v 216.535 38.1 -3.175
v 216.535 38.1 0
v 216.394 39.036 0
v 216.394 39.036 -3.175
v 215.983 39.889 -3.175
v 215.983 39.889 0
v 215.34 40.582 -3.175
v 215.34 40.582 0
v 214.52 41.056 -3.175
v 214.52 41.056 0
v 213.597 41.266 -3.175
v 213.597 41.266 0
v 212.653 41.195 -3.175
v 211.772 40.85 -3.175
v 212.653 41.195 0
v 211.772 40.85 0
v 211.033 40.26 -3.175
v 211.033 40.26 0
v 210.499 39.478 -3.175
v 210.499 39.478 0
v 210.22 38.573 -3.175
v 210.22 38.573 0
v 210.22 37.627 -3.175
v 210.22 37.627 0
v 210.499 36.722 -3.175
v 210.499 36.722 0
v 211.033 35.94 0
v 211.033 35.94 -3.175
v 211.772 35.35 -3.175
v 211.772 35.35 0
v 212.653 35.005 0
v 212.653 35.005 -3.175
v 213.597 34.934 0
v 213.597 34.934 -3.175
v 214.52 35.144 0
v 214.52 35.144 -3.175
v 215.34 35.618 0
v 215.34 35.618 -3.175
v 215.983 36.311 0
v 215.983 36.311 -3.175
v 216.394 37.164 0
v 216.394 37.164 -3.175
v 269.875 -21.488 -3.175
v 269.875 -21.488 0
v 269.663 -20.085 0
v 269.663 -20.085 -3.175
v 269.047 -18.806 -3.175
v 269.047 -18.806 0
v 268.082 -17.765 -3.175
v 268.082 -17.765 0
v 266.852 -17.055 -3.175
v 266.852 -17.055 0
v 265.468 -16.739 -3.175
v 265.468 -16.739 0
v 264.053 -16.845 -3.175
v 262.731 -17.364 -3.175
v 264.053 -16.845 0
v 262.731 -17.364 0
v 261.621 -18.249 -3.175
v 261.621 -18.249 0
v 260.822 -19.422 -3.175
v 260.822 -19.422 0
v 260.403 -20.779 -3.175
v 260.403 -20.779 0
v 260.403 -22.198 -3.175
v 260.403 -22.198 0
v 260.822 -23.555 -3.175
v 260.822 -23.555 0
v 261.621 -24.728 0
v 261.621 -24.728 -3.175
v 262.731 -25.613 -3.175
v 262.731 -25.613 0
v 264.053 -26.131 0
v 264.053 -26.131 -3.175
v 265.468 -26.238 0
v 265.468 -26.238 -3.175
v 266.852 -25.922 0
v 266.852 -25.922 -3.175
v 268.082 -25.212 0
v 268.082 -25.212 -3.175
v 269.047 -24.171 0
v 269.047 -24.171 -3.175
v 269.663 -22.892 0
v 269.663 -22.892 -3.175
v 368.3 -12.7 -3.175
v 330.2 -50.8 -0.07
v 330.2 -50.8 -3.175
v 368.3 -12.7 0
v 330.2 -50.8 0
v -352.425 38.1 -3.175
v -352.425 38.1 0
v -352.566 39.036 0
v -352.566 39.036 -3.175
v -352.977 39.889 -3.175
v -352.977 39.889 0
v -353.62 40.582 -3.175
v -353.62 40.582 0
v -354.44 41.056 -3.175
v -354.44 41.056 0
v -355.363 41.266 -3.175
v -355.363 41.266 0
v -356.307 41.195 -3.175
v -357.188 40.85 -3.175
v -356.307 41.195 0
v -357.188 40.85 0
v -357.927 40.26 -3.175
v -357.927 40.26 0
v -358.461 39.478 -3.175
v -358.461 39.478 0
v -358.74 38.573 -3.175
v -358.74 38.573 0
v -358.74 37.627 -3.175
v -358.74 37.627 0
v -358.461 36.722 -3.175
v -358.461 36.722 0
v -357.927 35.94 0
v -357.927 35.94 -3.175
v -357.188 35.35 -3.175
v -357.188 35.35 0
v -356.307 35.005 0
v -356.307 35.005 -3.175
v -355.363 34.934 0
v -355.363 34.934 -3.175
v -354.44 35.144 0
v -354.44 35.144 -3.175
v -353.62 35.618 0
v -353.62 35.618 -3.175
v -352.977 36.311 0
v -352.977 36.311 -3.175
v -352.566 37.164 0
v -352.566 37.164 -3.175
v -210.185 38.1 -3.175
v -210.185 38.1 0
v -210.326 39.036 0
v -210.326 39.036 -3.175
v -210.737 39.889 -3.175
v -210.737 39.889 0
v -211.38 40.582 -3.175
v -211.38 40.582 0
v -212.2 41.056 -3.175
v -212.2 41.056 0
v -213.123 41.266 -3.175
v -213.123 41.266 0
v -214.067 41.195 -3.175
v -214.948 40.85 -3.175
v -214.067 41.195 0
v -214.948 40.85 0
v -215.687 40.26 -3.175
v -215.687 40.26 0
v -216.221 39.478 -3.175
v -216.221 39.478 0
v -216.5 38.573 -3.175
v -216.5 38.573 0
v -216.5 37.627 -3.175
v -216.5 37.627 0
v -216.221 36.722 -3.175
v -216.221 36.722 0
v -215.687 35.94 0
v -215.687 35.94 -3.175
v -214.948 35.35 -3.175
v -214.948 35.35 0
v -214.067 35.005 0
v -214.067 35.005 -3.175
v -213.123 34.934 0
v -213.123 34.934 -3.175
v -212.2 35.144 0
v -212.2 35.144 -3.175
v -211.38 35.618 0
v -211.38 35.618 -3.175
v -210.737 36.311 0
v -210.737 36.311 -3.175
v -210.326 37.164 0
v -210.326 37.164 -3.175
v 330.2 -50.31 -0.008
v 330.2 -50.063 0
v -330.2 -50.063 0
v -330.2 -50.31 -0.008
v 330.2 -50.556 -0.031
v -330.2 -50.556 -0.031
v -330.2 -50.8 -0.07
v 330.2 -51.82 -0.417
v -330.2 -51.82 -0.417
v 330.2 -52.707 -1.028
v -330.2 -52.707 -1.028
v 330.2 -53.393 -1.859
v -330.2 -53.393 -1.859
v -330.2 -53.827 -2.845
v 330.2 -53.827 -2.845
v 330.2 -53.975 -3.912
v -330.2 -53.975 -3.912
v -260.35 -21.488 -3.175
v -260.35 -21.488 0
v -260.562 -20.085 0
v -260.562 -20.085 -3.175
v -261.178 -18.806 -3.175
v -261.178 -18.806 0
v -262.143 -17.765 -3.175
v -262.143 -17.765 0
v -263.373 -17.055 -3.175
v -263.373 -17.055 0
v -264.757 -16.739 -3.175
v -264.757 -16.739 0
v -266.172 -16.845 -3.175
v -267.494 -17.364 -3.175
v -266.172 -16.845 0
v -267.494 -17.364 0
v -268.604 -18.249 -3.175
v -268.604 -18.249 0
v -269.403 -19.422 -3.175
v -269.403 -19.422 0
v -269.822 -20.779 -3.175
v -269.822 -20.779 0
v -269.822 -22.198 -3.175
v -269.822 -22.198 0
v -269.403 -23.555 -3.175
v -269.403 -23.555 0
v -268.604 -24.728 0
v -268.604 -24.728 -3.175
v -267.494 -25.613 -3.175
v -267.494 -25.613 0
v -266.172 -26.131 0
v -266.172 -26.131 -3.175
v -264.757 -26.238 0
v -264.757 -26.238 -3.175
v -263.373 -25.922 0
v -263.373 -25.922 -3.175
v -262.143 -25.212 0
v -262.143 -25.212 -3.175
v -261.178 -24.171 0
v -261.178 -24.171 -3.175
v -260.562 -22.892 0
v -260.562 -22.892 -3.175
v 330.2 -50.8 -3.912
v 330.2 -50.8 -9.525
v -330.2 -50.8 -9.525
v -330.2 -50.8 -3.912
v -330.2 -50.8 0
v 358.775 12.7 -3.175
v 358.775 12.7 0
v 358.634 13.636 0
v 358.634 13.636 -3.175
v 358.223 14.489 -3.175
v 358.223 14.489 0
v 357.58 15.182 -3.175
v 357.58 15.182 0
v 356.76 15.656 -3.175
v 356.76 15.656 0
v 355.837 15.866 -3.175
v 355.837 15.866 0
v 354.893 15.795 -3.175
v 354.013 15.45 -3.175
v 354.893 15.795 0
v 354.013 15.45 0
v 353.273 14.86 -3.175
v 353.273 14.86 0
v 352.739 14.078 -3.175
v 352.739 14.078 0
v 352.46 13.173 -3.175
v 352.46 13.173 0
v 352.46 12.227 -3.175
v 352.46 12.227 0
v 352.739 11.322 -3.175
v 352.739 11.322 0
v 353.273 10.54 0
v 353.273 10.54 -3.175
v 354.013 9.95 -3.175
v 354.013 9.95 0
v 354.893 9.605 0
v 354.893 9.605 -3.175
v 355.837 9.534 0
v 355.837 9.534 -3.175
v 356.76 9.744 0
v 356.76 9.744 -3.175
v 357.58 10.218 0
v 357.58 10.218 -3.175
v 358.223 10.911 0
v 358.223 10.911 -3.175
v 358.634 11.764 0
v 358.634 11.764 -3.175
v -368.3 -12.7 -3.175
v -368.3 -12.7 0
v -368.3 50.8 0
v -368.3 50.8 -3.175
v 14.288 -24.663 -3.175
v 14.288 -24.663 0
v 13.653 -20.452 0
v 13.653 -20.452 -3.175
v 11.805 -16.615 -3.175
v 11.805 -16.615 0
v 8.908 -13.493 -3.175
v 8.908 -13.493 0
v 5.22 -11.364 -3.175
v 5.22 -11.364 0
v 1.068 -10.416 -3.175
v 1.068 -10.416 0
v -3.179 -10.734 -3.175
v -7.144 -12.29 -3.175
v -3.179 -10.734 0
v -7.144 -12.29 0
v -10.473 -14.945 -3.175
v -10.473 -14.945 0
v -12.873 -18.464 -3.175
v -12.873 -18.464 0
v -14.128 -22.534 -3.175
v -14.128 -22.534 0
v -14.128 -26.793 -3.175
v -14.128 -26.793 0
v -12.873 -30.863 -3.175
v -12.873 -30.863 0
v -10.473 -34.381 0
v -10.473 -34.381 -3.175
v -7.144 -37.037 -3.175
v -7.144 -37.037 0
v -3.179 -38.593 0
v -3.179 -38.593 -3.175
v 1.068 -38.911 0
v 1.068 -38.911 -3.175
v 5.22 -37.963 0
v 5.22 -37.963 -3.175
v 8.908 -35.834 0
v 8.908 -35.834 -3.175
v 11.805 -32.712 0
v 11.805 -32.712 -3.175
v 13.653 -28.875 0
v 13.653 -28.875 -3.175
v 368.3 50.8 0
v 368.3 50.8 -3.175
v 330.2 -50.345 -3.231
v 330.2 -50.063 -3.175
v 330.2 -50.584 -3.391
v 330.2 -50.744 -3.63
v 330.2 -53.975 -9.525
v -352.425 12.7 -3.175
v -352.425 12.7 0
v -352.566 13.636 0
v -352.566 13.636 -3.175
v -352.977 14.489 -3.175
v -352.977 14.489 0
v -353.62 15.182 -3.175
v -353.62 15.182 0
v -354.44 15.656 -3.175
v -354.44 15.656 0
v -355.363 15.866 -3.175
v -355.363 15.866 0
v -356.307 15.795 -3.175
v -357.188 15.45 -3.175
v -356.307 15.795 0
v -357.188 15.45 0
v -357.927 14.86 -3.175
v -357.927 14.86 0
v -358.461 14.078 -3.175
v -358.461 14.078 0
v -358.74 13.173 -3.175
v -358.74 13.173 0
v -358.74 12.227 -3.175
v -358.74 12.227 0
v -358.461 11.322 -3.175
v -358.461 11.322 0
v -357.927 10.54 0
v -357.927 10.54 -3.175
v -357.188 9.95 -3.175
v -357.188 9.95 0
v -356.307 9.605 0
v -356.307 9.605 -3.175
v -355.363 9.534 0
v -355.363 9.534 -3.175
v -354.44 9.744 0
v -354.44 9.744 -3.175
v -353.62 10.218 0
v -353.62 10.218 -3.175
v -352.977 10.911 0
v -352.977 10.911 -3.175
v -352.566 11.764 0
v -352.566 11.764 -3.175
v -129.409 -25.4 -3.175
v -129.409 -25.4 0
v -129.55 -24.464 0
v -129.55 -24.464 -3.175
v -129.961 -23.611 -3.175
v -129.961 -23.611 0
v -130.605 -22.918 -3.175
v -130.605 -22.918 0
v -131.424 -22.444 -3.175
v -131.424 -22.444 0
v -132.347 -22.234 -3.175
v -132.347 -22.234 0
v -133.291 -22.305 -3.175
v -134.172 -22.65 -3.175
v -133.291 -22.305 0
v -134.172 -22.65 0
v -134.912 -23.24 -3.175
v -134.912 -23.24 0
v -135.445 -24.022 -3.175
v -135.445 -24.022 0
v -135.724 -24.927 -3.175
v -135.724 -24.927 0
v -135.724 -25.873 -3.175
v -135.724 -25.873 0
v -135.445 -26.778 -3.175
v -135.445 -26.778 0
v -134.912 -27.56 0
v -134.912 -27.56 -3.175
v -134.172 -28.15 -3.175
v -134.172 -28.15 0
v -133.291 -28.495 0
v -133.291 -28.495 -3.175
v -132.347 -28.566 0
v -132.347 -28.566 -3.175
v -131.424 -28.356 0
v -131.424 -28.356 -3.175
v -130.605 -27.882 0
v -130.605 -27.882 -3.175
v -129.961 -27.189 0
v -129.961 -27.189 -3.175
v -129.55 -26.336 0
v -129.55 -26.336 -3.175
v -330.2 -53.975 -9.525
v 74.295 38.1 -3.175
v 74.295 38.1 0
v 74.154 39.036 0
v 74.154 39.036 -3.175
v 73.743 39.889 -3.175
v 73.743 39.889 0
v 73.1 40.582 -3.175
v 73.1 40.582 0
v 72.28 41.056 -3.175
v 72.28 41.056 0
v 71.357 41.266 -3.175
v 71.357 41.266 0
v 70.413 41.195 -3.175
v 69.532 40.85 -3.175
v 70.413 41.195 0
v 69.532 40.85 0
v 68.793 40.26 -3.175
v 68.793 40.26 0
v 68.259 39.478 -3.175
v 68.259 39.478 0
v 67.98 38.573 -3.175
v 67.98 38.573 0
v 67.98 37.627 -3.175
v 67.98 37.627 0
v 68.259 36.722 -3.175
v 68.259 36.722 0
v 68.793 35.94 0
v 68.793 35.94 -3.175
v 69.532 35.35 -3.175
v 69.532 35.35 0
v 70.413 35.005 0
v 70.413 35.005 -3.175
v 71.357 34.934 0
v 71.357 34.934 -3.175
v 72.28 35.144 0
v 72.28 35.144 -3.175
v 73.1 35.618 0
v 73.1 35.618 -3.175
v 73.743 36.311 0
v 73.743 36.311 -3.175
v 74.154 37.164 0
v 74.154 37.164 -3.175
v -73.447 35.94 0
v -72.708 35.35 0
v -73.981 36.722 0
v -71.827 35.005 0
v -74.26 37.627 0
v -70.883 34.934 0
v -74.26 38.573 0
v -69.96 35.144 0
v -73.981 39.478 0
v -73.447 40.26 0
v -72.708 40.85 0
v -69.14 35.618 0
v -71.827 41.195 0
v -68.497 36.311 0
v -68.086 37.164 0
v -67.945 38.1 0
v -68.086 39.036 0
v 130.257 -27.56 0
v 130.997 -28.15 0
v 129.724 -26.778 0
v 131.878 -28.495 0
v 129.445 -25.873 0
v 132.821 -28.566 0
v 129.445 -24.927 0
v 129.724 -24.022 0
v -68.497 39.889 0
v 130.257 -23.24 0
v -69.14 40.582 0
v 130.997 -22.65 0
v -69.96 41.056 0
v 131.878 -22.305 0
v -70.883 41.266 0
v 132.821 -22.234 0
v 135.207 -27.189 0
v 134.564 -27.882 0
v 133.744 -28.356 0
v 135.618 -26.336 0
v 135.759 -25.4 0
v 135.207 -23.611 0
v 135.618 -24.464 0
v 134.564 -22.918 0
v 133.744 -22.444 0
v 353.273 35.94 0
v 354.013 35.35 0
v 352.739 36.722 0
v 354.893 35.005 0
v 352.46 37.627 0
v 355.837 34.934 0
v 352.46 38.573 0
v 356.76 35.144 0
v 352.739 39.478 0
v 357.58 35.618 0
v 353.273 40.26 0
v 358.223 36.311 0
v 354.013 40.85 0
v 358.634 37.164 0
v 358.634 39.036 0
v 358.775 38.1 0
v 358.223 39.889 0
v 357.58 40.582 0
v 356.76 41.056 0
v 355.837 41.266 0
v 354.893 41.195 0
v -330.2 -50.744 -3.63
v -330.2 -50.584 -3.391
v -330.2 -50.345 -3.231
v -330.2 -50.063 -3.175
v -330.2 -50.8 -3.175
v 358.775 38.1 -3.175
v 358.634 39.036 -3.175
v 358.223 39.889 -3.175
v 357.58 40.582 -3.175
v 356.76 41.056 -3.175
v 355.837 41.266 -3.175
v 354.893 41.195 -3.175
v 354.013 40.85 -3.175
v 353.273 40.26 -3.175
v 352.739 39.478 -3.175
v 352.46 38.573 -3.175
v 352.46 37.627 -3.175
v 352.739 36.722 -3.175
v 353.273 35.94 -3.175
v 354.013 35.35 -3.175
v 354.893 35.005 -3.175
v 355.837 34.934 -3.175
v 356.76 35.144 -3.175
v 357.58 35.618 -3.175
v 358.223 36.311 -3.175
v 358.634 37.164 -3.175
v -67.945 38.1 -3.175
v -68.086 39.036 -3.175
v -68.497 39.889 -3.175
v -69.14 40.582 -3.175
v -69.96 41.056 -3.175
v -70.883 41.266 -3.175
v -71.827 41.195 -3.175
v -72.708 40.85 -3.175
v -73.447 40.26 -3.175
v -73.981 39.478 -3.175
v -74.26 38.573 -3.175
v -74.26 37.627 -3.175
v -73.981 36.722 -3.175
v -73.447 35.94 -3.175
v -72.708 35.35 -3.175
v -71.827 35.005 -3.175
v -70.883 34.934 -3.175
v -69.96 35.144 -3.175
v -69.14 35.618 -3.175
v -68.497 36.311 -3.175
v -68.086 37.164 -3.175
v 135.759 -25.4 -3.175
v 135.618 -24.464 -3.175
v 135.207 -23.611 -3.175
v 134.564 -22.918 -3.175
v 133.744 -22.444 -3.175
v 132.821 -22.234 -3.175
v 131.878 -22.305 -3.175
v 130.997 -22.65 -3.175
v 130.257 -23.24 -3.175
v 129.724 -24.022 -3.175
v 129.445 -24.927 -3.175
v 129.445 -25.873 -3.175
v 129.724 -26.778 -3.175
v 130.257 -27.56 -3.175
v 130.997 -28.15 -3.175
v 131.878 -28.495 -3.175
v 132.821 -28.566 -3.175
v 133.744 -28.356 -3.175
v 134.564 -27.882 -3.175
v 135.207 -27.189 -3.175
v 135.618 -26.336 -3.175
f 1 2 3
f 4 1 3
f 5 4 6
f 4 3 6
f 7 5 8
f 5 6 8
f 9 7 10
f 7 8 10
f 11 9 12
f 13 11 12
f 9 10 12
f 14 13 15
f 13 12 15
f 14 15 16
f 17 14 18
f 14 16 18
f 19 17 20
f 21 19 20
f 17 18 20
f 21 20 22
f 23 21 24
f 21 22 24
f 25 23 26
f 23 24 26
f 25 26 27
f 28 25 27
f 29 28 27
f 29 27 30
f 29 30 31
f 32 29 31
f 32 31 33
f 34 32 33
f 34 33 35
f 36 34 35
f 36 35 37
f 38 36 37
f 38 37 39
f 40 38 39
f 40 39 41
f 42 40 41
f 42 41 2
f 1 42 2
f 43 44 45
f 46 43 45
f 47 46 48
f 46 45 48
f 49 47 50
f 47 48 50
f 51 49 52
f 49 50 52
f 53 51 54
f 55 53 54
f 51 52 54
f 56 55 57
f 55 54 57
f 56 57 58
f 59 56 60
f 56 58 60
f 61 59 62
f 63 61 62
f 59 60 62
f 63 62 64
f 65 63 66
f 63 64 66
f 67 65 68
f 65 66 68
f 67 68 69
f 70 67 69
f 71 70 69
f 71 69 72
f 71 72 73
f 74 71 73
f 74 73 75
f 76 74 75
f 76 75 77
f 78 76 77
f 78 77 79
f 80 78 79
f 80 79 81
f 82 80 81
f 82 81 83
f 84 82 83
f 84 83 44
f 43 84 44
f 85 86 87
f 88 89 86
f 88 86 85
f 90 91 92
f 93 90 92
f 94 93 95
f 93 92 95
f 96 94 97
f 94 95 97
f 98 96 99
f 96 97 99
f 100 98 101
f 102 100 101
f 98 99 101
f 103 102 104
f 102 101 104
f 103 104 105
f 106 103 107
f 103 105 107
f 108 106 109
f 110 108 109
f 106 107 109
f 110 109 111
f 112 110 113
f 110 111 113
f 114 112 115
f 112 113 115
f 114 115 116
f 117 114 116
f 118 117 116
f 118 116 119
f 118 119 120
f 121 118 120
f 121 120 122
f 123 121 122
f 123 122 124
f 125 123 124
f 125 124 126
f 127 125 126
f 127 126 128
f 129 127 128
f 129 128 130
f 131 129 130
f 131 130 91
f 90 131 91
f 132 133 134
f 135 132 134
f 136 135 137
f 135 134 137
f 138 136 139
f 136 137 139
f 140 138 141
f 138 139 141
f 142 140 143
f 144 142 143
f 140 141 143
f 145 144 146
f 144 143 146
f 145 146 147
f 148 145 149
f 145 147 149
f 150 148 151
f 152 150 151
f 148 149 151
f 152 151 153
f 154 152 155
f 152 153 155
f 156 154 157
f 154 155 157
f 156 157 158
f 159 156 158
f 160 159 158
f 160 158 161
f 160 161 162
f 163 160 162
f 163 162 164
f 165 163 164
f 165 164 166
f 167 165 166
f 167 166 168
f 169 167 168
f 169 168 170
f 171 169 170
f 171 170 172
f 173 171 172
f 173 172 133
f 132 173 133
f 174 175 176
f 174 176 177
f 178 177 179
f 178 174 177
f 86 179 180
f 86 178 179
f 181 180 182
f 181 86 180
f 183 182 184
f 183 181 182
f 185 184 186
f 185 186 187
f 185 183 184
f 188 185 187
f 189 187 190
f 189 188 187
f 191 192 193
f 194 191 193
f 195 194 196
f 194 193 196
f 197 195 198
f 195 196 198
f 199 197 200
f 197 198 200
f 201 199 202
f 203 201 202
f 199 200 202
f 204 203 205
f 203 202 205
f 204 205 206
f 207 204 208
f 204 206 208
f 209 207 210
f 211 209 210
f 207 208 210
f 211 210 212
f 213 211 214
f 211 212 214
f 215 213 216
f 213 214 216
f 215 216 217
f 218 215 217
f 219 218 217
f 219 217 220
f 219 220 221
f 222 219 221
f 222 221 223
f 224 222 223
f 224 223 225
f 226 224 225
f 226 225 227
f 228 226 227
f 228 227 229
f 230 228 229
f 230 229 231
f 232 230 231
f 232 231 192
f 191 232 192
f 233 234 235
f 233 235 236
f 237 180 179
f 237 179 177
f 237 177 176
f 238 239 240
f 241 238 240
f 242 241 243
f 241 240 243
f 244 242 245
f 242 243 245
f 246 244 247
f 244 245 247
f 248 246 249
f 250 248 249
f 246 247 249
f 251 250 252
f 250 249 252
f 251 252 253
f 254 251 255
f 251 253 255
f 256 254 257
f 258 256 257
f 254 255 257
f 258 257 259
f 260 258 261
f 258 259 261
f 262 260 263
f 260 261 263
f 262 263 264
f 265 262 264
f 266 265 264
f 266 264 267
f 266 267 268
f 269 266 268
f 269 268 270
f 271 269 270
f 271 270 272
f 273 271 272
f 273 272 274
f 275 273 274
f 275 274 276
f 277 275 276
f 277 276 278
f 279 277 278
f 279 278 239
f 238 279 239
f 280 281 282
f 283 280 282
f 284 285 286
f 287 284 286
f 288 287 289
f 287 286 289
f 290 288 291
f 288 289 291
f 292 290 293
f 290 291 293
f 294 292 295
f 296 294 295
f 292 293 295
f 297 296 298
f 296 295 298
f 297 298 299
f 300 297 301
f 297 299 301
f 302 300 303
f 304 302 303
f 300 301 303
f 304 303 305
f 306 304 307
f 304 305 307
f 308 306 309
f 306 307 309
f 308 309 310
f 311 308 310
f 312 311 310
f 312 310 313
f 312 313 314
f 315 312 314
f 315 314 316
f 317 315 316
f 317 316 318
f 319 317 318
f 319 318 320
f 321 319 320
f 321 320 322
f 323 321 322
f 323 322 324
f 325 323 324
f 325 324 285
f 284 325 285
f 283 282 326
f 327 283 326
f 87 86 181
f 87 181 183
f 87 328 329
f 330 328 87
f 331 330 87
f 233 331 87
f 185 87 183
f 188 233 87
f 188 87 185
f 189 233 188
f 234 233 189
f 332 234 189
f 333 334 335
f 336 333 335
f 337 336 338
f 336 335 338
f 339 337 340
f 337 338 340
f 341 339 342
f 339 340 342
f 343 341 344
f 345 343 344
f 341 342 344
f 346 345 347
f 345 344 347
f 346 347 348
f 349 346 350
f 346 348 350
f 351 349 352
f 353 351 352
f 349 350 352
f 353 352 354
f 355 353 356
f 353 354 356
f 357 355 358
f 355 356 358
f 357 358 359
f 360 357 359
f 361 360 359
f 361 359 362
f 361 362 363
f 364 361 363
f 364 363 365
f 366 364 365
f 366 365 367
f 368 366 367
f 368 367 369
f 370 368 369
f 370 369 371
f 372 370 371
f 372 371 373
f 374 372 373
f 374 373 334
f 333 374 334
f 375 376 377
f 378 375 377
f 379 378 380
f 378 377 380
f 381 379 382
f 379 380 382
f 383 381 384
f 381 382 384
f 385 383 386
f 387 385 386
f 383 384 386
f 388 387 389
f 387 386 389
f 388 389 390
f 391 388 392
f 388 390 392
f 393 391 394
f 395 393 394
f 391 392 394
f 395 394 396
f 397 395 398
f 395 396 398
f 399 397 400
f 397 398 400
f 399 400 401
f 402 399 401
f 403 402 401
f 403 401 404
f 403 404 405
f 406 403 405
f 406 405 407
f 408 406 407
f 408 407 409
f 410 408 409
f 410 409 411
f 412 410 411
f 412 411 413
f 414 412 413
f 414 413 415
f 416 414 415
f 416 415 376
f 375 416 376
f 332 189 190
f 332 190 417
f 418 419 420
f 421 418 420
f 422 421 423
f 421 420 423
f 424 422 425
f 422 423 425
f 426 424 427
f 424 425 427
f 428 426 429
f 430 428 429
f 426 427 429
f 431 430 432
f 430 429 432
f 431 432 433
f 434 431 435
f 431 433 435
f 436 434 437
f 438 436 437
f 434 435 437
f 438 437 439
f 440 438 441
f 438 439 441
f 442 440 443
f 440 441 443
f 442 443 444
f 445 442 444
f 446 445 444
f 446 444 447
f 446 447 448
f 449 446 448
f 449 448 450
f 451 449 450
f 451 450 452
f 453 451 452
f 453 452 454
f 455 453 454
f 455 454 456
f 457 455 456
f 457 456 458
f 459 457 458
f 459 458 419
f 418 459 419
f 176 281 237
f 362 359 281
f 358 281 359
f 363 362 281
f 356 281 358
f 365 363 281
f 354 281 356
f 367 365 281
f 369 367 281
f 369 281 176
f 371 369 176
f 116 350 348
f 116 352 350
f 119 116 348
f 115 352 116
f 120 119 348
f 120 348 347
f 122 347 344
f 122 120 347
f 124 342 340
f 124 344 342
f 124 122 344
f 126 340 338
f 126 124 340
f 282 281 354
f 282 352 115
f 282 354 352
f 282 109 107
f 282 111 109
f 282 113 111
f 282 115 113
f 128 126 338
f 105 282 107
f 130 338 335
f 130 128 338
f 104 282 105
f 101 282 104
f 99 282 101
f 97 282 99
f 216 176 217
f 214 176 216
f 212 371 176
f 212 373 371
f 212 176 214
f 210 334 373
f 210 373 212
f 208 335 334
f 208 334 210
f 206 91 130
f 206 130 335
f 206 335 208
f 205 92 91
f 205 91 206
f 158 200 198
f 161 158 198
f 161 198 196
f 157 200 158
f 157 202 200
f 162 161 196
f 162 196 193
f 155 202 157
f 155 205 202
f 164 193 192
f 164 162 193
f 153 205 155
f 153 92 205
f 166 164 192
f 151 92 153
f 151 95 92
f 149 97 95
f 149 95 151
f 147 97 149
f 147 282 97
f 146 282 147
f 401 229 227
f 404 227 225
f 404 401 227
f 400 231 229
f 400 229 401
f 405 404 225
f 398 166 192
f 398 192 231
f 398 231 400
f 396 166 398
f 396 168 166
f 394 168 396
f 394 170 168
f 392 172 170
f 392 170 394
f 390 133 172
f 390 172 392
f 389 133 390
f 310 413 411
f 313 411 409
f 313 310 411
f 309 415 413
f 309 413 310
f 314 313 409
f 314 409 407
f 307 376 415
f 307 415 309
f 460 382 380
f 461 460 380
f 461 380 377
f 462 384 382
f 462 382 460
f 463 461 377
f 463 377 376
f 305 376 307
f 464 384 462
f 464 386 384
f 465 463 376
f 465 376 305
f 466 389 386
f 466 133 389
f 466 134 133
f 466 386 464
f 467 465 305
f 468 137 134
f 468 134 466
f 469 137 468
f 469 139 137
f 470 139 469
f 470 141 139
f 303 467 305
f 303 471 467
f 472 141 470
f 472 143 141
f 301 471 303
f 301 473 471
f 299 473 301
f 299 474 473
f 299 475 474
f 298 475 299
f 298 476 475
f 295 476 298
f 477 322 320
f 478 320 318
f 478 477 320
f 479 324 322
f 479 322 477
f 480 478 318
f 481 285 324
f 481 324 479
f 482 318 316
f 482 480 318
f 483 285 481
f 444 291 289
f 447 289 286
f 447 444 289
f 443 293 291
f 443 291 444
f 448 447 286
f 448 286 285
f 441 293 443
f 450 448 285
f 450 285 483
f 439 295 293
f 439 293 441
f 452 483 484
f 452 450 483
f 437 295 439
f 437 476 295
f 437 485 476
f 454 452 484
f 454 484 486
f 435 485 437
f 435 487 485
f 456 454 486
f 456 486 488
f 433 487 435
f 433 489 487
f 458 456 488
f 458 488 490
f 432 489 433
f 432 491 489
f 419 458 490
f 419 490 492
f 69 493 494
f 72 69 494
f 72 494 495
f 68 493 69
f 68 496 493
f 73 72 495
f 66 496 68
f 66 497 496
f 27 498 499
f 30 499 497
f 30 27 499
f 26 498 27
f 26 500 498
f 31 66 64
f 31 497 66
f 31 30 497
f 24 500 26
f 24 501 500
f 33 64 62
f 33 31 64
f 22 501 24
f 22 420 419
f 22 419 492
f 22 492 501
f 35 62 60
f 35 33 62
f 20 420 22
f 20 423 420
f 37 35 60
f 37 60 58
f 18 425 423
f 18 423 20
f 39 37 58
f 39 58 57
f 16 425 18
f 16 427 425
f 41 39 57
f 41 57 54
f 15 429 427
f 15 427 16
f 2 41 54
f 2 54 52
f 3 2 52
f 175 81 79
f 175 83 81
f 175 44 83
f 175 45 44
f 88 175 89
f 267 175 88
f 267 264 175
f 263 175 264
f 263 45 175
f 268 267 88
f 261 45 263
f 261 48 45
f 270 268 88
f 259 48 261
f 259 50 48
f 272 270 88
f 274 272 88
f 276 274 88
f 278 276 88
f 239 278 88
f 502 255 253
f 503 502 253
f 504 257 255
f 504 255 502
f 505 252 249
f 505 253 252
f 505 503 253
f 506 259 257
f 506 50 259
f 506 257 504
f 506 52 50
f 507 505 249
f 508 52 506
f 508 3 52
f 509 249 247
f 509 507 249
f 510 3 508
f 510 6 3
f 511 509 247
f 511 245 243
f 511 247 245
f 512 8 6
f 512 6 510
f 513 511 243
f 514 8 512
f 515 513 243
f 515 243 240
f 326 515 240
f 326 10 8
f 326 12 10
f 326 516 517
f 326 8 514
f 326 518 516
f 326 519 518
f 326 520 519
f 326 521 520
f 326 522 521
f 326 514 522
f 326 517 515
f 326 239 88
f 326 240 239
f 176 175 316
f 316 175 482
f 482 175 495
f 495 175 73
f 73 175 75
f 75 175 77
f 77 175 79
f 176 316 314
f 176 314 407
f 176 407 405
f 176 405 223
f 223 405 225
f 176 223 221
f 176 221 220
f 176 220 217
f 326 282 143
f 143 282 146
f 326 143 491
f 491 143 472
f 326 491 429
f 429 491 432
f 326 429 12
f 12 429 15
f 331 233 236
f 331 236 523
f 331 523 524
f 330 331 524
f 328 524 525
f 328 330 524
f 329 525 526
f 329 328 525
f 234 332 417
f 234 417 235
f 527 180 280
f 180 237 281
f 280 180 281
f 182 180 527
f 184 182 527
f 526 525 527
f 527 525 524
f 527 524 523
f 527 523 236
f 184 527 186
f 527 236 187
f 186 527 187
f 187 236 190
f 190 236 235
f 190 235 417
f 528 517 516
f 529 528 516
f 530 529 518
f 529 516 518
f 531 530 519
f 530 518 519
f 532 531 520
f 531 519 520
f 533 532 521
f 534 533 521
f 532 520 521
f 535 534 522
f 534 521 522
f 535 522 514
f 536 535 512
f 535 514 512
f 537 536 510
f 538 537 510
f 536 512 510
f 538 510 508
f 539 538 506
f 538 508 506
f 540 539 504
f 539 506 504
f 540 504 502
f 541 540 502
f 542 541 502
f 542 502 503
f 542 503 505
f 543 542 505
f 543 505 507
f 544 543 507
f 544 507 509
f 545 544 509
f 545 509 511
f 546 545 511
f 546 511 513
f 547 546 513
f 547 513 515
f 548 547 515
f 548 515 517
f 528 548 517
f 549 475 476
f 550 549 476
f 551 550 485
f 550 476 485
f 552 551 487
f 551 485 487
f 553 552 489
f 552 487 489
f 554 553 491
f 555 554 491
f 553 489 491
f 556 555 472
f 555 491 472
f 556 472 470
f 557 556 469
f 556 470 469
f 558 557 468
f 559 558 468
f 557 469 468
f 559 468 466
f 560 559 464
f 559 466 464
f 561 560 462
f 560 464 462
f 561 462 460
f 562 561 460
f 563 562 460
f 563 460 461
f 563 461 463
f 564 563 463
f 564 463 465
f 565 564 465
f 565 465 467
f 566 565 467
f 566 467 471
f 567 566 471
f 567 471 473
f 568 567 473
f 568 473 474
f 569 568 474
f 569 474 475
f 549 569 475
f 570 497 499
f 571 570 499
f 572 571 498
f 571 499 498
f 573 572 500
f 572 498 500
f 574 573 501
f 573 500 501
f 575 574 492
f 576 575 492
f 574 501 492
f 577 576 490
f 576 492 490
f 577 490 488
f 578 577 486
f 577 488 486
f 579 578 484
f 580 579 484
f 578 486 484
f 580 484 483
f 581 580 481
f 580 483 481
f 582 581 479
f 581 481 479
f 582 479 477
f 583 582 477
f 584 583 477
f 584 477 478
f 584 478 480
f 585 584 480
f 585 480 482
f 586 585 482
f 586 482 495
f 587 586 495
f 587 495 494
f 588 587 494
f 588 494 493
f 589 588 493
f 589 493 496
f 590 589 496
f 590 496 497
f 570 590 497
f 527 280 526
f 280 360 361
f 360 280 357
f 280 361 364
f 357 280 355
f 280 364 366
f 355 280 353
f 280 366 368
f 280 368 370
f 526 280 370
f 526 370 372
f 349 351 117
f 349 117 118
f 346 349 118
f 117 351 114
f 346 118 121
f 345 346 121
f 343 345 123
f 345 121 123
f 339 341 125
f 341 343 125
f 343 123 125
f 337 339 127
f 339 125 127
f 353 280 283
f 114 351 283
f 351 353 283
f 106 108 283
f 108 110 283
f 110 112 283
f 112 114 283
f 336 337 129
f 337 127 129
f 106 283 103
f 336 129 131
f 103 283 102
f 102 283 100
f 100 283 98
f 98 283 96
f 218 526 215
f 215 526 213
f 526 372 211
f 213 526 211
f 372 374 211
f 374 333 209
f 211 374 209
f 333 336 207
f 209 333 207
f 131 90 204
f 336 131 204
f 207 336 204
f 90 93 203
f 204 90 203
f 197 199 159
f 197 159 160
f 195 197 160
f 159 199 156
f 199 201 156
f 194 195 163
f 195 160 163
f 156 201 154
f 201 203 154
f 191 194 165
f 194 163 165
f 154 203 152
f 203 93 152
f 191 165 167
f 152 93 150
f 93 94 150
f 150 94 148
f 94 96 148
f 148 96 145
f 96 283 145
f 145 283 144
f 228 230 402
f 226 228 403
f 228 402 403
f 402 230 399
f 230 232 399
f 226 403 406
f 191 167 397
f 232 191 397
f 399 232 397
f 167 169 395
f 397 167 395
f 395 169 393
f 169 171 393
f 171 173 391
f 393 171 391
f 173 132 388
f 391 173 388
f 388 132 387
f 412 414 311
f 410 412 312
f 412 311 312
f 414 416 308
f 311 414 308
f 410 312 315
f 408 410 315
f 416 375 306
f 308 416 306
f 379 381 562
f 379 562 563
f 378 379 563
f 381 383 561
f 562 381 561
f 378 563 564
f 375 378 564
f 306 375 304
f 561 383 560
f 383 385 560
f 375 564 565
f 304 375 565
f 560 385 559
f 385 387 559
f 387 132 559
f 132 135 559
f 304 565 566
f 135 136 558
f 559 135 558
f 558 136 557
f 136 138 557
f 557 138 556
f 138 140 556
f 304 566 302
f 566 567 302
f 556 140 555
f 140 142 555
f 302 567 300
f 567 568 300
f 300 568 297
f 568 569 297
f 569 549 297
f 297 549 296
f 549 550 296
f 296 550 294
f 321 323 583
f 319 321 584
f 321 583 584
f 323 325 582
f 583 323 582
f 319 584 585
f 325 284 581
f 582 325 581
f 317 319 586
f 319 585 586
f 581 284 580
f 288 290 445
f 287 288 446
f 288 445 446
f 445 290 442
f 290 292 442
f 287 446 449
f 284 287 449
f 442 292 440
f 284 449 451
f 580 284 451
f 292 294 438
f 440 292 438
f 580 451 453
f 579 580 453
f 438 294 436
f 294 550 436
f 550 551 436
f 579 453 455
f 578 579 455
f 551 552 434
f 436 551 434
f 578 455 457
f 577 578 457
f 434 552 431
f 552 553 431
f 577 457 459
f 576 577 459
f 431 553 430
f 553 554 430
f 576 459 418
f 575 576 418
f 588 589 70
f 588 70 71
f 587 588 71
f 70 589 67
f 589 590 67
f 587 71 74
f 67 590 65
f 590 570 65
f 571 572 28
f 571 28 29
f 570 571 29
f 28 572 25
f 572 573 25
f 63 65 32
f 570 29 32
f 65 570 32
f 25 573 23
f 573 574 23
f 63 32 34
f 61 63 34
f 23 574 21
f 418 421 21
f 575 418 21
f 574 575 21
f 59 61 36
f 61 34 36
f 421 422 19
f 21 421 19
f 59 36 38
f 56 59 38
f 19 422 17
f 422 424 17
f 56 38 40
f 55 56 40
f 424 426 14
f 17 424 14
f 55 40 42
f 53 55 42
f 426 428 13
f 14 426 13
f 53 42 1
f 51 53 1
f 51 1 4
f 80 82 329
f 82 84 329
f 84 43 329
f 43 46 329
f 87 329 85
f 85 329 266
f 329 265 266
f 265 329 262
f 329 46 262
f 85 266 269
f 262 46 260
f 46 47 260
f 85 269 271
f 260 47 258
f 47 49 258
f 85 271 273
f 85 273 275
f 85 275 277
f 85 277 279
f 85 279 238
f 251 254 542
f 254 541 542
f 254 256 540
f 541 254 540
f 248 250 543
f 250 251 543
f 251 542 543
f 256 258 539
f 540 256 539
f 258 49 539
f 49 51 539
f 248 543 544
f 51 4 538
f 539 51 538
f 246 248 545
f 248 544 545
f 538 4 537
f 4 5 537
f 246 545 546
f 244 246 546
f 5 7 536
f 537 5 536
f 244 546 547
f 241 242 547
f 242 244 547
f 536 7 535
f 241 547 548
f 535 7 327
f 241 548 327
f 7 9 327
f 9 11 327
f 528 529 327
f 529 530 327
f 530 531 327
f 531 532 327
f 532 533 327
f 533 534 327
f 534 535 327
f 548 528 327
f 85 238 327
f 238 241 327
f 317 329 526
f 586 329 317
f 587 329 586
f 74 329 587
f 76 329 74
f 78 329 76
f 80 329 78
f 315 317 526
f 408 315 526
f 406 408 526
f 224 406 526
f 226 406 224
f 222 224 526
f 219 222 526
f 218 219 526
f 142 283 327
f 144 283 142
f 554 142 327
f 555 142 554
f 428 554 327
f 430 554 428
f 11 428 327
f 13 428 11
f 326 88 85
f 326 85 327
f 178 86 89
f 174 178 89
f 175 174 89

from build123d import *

# Parameters (mm, degrees)
SKETCH1_W                    = 736.6
SKETCH1_H                    = 101.6
BASE_FLANGE1_DEPTH           = 3.175
CUT_EXTRUDE2_DEPTH           = 3.175
EDGE_FLANGE1_STRIP_W         = 14.1732
EDGE_FLANGE1_STRIP_H         = 3.175
EDGE_FLANGE1_STRIP_CUT_DEPTH = 660.4
EDGE_FLANGE1_DEPTH           = 660.4
SKETCH12_R                   = 14.2875
SKETCH12_R_2                 = 4.7625
CUT_EXTRUDE3_DEPTH           = 373.35589998
SKETCH13_R                   = 3.175
CUT_EXTRUDE4_DEPTH           = 373.35589998


# Sheet-metal steps are written as plain solids
with BuildPart() as part:
    # Sketch1 → Base-Flange1 (new body)
    with BuildSketch(Plane.XY):
        Rectangle(SKETCH1_W, SKETCH1_H)
    extrude(amount=-BASE_FLANGE1_DEPTH)

    # Sketch11 → Cut-Extrude2 (cut)
    with BuildSketch(Plane.XY):
        Polygon((-368.3, -50.8), (-330.2, -50.8), (-368.3, -12.7), align=None)
        Polygon((368.3, -50.8), (330.2, -50.8), (368.3, -12.7), align=None)
    extrude(amount=-CUT_EXTRUDE2_DEPTH, mode=Mode.SUBTRACT)

    # Edge-Flange1 strip (across the edge) → Edge-Flange1 strip cut (cut)
    with BuildSketch(Plane(origin=(330.2, -50.8, -3.175), x_dir=(0, 1, 0), z_dir=(-1, 0, 0))):
        with Locations((-6.35, -1.5875)):
            Rectangle(EDGE_FLANGE1_STRIP_W, EDGE_FLANGE1_STRIP_H)
    extrude(amount=EDGE_FLANGE1_STRIP_CUT_DEPTH, mode=Mode.SUBTRACT)

    # Edge-Flange1 section (across the edge) → Edge-Flange1 (add)
    with BuildSketch(Plane(origin=(330.2, -50.8, -3.175), x_dir=(0, 1, 0), z_dir=(-1, 0, 0))):
        with BuildLine():
            Line((-3.175, 0.7366), (-3.175, 6.35))
            Line((-3.175, 6.35), (0, 6.35))
            Line((0, 6.35), (0, 0.7366))
            ThreePointArc((0, 0.7366), (0.215745145, 0.215745145), (0.7366, 0))
            Line((0.7366, 0), (0.7366, -3.175))
            ThreePointArc((0.7366, -3.175), (-2.029318885, -2.029318885), (-3.175, 0.7366))
        make_face()
    extrude(amount=EDGE_FLANGE1_DEPTH)

    # Sketch12 → Cut-Extrude3 (cut, through all)
    with BuildSketch(Plane.XY):
        with Locations((0, -24.6634)):
            Circle(SKETCH12_R)
        with Locations((-265.1125, -21.4884)):
            Circle(SKETCH12_R_2)
        with Locations((265.1125, -21.4884)):
            Circle(SKETCH12_R_2)
    extrude(amount=-CUT_EXTRUDE3_DEPTH, mode=Mode.SUBTRACT)

    # Sketch13 → Cut-Extrude4 (cut, through all)
    with BuildSketch(Plane.XY):
        with Locations((355.6, 38.1)):
            Circle(SKETCH13_R)
        with Locations((355.6, 12.7)):
            Circle(SKETCH13_R)
        with Locations((-355.6, 12.7)):
            Circle(SKETCH13_R)
        with Locations((-355.6, 38.1)):
            Circle(SKETCH13_R)
        with Locations((-213.36, 38.1)):
            Circle(SKETCH13_R)
        with Locations((-71.12, 38.1)):
            Circle(SKETCH13_R)
        with Locations((71.12, 38.1)):
            Circle(SKETCH13_R)
        with Locations((213.36, 38.1)):
            Circle(SKETCH13_R)
        with Locations((-132.584083533, -25.4)):
            Circle(SKETCH13_R)
        with Locations((132.584083533, -25.4)):
            Circle(SKETCH13_R)
    extrude(amount=-CUT_EXTRUDE4_DEPTH, mode=Mode.SUBTRACT)


solid = part.part
